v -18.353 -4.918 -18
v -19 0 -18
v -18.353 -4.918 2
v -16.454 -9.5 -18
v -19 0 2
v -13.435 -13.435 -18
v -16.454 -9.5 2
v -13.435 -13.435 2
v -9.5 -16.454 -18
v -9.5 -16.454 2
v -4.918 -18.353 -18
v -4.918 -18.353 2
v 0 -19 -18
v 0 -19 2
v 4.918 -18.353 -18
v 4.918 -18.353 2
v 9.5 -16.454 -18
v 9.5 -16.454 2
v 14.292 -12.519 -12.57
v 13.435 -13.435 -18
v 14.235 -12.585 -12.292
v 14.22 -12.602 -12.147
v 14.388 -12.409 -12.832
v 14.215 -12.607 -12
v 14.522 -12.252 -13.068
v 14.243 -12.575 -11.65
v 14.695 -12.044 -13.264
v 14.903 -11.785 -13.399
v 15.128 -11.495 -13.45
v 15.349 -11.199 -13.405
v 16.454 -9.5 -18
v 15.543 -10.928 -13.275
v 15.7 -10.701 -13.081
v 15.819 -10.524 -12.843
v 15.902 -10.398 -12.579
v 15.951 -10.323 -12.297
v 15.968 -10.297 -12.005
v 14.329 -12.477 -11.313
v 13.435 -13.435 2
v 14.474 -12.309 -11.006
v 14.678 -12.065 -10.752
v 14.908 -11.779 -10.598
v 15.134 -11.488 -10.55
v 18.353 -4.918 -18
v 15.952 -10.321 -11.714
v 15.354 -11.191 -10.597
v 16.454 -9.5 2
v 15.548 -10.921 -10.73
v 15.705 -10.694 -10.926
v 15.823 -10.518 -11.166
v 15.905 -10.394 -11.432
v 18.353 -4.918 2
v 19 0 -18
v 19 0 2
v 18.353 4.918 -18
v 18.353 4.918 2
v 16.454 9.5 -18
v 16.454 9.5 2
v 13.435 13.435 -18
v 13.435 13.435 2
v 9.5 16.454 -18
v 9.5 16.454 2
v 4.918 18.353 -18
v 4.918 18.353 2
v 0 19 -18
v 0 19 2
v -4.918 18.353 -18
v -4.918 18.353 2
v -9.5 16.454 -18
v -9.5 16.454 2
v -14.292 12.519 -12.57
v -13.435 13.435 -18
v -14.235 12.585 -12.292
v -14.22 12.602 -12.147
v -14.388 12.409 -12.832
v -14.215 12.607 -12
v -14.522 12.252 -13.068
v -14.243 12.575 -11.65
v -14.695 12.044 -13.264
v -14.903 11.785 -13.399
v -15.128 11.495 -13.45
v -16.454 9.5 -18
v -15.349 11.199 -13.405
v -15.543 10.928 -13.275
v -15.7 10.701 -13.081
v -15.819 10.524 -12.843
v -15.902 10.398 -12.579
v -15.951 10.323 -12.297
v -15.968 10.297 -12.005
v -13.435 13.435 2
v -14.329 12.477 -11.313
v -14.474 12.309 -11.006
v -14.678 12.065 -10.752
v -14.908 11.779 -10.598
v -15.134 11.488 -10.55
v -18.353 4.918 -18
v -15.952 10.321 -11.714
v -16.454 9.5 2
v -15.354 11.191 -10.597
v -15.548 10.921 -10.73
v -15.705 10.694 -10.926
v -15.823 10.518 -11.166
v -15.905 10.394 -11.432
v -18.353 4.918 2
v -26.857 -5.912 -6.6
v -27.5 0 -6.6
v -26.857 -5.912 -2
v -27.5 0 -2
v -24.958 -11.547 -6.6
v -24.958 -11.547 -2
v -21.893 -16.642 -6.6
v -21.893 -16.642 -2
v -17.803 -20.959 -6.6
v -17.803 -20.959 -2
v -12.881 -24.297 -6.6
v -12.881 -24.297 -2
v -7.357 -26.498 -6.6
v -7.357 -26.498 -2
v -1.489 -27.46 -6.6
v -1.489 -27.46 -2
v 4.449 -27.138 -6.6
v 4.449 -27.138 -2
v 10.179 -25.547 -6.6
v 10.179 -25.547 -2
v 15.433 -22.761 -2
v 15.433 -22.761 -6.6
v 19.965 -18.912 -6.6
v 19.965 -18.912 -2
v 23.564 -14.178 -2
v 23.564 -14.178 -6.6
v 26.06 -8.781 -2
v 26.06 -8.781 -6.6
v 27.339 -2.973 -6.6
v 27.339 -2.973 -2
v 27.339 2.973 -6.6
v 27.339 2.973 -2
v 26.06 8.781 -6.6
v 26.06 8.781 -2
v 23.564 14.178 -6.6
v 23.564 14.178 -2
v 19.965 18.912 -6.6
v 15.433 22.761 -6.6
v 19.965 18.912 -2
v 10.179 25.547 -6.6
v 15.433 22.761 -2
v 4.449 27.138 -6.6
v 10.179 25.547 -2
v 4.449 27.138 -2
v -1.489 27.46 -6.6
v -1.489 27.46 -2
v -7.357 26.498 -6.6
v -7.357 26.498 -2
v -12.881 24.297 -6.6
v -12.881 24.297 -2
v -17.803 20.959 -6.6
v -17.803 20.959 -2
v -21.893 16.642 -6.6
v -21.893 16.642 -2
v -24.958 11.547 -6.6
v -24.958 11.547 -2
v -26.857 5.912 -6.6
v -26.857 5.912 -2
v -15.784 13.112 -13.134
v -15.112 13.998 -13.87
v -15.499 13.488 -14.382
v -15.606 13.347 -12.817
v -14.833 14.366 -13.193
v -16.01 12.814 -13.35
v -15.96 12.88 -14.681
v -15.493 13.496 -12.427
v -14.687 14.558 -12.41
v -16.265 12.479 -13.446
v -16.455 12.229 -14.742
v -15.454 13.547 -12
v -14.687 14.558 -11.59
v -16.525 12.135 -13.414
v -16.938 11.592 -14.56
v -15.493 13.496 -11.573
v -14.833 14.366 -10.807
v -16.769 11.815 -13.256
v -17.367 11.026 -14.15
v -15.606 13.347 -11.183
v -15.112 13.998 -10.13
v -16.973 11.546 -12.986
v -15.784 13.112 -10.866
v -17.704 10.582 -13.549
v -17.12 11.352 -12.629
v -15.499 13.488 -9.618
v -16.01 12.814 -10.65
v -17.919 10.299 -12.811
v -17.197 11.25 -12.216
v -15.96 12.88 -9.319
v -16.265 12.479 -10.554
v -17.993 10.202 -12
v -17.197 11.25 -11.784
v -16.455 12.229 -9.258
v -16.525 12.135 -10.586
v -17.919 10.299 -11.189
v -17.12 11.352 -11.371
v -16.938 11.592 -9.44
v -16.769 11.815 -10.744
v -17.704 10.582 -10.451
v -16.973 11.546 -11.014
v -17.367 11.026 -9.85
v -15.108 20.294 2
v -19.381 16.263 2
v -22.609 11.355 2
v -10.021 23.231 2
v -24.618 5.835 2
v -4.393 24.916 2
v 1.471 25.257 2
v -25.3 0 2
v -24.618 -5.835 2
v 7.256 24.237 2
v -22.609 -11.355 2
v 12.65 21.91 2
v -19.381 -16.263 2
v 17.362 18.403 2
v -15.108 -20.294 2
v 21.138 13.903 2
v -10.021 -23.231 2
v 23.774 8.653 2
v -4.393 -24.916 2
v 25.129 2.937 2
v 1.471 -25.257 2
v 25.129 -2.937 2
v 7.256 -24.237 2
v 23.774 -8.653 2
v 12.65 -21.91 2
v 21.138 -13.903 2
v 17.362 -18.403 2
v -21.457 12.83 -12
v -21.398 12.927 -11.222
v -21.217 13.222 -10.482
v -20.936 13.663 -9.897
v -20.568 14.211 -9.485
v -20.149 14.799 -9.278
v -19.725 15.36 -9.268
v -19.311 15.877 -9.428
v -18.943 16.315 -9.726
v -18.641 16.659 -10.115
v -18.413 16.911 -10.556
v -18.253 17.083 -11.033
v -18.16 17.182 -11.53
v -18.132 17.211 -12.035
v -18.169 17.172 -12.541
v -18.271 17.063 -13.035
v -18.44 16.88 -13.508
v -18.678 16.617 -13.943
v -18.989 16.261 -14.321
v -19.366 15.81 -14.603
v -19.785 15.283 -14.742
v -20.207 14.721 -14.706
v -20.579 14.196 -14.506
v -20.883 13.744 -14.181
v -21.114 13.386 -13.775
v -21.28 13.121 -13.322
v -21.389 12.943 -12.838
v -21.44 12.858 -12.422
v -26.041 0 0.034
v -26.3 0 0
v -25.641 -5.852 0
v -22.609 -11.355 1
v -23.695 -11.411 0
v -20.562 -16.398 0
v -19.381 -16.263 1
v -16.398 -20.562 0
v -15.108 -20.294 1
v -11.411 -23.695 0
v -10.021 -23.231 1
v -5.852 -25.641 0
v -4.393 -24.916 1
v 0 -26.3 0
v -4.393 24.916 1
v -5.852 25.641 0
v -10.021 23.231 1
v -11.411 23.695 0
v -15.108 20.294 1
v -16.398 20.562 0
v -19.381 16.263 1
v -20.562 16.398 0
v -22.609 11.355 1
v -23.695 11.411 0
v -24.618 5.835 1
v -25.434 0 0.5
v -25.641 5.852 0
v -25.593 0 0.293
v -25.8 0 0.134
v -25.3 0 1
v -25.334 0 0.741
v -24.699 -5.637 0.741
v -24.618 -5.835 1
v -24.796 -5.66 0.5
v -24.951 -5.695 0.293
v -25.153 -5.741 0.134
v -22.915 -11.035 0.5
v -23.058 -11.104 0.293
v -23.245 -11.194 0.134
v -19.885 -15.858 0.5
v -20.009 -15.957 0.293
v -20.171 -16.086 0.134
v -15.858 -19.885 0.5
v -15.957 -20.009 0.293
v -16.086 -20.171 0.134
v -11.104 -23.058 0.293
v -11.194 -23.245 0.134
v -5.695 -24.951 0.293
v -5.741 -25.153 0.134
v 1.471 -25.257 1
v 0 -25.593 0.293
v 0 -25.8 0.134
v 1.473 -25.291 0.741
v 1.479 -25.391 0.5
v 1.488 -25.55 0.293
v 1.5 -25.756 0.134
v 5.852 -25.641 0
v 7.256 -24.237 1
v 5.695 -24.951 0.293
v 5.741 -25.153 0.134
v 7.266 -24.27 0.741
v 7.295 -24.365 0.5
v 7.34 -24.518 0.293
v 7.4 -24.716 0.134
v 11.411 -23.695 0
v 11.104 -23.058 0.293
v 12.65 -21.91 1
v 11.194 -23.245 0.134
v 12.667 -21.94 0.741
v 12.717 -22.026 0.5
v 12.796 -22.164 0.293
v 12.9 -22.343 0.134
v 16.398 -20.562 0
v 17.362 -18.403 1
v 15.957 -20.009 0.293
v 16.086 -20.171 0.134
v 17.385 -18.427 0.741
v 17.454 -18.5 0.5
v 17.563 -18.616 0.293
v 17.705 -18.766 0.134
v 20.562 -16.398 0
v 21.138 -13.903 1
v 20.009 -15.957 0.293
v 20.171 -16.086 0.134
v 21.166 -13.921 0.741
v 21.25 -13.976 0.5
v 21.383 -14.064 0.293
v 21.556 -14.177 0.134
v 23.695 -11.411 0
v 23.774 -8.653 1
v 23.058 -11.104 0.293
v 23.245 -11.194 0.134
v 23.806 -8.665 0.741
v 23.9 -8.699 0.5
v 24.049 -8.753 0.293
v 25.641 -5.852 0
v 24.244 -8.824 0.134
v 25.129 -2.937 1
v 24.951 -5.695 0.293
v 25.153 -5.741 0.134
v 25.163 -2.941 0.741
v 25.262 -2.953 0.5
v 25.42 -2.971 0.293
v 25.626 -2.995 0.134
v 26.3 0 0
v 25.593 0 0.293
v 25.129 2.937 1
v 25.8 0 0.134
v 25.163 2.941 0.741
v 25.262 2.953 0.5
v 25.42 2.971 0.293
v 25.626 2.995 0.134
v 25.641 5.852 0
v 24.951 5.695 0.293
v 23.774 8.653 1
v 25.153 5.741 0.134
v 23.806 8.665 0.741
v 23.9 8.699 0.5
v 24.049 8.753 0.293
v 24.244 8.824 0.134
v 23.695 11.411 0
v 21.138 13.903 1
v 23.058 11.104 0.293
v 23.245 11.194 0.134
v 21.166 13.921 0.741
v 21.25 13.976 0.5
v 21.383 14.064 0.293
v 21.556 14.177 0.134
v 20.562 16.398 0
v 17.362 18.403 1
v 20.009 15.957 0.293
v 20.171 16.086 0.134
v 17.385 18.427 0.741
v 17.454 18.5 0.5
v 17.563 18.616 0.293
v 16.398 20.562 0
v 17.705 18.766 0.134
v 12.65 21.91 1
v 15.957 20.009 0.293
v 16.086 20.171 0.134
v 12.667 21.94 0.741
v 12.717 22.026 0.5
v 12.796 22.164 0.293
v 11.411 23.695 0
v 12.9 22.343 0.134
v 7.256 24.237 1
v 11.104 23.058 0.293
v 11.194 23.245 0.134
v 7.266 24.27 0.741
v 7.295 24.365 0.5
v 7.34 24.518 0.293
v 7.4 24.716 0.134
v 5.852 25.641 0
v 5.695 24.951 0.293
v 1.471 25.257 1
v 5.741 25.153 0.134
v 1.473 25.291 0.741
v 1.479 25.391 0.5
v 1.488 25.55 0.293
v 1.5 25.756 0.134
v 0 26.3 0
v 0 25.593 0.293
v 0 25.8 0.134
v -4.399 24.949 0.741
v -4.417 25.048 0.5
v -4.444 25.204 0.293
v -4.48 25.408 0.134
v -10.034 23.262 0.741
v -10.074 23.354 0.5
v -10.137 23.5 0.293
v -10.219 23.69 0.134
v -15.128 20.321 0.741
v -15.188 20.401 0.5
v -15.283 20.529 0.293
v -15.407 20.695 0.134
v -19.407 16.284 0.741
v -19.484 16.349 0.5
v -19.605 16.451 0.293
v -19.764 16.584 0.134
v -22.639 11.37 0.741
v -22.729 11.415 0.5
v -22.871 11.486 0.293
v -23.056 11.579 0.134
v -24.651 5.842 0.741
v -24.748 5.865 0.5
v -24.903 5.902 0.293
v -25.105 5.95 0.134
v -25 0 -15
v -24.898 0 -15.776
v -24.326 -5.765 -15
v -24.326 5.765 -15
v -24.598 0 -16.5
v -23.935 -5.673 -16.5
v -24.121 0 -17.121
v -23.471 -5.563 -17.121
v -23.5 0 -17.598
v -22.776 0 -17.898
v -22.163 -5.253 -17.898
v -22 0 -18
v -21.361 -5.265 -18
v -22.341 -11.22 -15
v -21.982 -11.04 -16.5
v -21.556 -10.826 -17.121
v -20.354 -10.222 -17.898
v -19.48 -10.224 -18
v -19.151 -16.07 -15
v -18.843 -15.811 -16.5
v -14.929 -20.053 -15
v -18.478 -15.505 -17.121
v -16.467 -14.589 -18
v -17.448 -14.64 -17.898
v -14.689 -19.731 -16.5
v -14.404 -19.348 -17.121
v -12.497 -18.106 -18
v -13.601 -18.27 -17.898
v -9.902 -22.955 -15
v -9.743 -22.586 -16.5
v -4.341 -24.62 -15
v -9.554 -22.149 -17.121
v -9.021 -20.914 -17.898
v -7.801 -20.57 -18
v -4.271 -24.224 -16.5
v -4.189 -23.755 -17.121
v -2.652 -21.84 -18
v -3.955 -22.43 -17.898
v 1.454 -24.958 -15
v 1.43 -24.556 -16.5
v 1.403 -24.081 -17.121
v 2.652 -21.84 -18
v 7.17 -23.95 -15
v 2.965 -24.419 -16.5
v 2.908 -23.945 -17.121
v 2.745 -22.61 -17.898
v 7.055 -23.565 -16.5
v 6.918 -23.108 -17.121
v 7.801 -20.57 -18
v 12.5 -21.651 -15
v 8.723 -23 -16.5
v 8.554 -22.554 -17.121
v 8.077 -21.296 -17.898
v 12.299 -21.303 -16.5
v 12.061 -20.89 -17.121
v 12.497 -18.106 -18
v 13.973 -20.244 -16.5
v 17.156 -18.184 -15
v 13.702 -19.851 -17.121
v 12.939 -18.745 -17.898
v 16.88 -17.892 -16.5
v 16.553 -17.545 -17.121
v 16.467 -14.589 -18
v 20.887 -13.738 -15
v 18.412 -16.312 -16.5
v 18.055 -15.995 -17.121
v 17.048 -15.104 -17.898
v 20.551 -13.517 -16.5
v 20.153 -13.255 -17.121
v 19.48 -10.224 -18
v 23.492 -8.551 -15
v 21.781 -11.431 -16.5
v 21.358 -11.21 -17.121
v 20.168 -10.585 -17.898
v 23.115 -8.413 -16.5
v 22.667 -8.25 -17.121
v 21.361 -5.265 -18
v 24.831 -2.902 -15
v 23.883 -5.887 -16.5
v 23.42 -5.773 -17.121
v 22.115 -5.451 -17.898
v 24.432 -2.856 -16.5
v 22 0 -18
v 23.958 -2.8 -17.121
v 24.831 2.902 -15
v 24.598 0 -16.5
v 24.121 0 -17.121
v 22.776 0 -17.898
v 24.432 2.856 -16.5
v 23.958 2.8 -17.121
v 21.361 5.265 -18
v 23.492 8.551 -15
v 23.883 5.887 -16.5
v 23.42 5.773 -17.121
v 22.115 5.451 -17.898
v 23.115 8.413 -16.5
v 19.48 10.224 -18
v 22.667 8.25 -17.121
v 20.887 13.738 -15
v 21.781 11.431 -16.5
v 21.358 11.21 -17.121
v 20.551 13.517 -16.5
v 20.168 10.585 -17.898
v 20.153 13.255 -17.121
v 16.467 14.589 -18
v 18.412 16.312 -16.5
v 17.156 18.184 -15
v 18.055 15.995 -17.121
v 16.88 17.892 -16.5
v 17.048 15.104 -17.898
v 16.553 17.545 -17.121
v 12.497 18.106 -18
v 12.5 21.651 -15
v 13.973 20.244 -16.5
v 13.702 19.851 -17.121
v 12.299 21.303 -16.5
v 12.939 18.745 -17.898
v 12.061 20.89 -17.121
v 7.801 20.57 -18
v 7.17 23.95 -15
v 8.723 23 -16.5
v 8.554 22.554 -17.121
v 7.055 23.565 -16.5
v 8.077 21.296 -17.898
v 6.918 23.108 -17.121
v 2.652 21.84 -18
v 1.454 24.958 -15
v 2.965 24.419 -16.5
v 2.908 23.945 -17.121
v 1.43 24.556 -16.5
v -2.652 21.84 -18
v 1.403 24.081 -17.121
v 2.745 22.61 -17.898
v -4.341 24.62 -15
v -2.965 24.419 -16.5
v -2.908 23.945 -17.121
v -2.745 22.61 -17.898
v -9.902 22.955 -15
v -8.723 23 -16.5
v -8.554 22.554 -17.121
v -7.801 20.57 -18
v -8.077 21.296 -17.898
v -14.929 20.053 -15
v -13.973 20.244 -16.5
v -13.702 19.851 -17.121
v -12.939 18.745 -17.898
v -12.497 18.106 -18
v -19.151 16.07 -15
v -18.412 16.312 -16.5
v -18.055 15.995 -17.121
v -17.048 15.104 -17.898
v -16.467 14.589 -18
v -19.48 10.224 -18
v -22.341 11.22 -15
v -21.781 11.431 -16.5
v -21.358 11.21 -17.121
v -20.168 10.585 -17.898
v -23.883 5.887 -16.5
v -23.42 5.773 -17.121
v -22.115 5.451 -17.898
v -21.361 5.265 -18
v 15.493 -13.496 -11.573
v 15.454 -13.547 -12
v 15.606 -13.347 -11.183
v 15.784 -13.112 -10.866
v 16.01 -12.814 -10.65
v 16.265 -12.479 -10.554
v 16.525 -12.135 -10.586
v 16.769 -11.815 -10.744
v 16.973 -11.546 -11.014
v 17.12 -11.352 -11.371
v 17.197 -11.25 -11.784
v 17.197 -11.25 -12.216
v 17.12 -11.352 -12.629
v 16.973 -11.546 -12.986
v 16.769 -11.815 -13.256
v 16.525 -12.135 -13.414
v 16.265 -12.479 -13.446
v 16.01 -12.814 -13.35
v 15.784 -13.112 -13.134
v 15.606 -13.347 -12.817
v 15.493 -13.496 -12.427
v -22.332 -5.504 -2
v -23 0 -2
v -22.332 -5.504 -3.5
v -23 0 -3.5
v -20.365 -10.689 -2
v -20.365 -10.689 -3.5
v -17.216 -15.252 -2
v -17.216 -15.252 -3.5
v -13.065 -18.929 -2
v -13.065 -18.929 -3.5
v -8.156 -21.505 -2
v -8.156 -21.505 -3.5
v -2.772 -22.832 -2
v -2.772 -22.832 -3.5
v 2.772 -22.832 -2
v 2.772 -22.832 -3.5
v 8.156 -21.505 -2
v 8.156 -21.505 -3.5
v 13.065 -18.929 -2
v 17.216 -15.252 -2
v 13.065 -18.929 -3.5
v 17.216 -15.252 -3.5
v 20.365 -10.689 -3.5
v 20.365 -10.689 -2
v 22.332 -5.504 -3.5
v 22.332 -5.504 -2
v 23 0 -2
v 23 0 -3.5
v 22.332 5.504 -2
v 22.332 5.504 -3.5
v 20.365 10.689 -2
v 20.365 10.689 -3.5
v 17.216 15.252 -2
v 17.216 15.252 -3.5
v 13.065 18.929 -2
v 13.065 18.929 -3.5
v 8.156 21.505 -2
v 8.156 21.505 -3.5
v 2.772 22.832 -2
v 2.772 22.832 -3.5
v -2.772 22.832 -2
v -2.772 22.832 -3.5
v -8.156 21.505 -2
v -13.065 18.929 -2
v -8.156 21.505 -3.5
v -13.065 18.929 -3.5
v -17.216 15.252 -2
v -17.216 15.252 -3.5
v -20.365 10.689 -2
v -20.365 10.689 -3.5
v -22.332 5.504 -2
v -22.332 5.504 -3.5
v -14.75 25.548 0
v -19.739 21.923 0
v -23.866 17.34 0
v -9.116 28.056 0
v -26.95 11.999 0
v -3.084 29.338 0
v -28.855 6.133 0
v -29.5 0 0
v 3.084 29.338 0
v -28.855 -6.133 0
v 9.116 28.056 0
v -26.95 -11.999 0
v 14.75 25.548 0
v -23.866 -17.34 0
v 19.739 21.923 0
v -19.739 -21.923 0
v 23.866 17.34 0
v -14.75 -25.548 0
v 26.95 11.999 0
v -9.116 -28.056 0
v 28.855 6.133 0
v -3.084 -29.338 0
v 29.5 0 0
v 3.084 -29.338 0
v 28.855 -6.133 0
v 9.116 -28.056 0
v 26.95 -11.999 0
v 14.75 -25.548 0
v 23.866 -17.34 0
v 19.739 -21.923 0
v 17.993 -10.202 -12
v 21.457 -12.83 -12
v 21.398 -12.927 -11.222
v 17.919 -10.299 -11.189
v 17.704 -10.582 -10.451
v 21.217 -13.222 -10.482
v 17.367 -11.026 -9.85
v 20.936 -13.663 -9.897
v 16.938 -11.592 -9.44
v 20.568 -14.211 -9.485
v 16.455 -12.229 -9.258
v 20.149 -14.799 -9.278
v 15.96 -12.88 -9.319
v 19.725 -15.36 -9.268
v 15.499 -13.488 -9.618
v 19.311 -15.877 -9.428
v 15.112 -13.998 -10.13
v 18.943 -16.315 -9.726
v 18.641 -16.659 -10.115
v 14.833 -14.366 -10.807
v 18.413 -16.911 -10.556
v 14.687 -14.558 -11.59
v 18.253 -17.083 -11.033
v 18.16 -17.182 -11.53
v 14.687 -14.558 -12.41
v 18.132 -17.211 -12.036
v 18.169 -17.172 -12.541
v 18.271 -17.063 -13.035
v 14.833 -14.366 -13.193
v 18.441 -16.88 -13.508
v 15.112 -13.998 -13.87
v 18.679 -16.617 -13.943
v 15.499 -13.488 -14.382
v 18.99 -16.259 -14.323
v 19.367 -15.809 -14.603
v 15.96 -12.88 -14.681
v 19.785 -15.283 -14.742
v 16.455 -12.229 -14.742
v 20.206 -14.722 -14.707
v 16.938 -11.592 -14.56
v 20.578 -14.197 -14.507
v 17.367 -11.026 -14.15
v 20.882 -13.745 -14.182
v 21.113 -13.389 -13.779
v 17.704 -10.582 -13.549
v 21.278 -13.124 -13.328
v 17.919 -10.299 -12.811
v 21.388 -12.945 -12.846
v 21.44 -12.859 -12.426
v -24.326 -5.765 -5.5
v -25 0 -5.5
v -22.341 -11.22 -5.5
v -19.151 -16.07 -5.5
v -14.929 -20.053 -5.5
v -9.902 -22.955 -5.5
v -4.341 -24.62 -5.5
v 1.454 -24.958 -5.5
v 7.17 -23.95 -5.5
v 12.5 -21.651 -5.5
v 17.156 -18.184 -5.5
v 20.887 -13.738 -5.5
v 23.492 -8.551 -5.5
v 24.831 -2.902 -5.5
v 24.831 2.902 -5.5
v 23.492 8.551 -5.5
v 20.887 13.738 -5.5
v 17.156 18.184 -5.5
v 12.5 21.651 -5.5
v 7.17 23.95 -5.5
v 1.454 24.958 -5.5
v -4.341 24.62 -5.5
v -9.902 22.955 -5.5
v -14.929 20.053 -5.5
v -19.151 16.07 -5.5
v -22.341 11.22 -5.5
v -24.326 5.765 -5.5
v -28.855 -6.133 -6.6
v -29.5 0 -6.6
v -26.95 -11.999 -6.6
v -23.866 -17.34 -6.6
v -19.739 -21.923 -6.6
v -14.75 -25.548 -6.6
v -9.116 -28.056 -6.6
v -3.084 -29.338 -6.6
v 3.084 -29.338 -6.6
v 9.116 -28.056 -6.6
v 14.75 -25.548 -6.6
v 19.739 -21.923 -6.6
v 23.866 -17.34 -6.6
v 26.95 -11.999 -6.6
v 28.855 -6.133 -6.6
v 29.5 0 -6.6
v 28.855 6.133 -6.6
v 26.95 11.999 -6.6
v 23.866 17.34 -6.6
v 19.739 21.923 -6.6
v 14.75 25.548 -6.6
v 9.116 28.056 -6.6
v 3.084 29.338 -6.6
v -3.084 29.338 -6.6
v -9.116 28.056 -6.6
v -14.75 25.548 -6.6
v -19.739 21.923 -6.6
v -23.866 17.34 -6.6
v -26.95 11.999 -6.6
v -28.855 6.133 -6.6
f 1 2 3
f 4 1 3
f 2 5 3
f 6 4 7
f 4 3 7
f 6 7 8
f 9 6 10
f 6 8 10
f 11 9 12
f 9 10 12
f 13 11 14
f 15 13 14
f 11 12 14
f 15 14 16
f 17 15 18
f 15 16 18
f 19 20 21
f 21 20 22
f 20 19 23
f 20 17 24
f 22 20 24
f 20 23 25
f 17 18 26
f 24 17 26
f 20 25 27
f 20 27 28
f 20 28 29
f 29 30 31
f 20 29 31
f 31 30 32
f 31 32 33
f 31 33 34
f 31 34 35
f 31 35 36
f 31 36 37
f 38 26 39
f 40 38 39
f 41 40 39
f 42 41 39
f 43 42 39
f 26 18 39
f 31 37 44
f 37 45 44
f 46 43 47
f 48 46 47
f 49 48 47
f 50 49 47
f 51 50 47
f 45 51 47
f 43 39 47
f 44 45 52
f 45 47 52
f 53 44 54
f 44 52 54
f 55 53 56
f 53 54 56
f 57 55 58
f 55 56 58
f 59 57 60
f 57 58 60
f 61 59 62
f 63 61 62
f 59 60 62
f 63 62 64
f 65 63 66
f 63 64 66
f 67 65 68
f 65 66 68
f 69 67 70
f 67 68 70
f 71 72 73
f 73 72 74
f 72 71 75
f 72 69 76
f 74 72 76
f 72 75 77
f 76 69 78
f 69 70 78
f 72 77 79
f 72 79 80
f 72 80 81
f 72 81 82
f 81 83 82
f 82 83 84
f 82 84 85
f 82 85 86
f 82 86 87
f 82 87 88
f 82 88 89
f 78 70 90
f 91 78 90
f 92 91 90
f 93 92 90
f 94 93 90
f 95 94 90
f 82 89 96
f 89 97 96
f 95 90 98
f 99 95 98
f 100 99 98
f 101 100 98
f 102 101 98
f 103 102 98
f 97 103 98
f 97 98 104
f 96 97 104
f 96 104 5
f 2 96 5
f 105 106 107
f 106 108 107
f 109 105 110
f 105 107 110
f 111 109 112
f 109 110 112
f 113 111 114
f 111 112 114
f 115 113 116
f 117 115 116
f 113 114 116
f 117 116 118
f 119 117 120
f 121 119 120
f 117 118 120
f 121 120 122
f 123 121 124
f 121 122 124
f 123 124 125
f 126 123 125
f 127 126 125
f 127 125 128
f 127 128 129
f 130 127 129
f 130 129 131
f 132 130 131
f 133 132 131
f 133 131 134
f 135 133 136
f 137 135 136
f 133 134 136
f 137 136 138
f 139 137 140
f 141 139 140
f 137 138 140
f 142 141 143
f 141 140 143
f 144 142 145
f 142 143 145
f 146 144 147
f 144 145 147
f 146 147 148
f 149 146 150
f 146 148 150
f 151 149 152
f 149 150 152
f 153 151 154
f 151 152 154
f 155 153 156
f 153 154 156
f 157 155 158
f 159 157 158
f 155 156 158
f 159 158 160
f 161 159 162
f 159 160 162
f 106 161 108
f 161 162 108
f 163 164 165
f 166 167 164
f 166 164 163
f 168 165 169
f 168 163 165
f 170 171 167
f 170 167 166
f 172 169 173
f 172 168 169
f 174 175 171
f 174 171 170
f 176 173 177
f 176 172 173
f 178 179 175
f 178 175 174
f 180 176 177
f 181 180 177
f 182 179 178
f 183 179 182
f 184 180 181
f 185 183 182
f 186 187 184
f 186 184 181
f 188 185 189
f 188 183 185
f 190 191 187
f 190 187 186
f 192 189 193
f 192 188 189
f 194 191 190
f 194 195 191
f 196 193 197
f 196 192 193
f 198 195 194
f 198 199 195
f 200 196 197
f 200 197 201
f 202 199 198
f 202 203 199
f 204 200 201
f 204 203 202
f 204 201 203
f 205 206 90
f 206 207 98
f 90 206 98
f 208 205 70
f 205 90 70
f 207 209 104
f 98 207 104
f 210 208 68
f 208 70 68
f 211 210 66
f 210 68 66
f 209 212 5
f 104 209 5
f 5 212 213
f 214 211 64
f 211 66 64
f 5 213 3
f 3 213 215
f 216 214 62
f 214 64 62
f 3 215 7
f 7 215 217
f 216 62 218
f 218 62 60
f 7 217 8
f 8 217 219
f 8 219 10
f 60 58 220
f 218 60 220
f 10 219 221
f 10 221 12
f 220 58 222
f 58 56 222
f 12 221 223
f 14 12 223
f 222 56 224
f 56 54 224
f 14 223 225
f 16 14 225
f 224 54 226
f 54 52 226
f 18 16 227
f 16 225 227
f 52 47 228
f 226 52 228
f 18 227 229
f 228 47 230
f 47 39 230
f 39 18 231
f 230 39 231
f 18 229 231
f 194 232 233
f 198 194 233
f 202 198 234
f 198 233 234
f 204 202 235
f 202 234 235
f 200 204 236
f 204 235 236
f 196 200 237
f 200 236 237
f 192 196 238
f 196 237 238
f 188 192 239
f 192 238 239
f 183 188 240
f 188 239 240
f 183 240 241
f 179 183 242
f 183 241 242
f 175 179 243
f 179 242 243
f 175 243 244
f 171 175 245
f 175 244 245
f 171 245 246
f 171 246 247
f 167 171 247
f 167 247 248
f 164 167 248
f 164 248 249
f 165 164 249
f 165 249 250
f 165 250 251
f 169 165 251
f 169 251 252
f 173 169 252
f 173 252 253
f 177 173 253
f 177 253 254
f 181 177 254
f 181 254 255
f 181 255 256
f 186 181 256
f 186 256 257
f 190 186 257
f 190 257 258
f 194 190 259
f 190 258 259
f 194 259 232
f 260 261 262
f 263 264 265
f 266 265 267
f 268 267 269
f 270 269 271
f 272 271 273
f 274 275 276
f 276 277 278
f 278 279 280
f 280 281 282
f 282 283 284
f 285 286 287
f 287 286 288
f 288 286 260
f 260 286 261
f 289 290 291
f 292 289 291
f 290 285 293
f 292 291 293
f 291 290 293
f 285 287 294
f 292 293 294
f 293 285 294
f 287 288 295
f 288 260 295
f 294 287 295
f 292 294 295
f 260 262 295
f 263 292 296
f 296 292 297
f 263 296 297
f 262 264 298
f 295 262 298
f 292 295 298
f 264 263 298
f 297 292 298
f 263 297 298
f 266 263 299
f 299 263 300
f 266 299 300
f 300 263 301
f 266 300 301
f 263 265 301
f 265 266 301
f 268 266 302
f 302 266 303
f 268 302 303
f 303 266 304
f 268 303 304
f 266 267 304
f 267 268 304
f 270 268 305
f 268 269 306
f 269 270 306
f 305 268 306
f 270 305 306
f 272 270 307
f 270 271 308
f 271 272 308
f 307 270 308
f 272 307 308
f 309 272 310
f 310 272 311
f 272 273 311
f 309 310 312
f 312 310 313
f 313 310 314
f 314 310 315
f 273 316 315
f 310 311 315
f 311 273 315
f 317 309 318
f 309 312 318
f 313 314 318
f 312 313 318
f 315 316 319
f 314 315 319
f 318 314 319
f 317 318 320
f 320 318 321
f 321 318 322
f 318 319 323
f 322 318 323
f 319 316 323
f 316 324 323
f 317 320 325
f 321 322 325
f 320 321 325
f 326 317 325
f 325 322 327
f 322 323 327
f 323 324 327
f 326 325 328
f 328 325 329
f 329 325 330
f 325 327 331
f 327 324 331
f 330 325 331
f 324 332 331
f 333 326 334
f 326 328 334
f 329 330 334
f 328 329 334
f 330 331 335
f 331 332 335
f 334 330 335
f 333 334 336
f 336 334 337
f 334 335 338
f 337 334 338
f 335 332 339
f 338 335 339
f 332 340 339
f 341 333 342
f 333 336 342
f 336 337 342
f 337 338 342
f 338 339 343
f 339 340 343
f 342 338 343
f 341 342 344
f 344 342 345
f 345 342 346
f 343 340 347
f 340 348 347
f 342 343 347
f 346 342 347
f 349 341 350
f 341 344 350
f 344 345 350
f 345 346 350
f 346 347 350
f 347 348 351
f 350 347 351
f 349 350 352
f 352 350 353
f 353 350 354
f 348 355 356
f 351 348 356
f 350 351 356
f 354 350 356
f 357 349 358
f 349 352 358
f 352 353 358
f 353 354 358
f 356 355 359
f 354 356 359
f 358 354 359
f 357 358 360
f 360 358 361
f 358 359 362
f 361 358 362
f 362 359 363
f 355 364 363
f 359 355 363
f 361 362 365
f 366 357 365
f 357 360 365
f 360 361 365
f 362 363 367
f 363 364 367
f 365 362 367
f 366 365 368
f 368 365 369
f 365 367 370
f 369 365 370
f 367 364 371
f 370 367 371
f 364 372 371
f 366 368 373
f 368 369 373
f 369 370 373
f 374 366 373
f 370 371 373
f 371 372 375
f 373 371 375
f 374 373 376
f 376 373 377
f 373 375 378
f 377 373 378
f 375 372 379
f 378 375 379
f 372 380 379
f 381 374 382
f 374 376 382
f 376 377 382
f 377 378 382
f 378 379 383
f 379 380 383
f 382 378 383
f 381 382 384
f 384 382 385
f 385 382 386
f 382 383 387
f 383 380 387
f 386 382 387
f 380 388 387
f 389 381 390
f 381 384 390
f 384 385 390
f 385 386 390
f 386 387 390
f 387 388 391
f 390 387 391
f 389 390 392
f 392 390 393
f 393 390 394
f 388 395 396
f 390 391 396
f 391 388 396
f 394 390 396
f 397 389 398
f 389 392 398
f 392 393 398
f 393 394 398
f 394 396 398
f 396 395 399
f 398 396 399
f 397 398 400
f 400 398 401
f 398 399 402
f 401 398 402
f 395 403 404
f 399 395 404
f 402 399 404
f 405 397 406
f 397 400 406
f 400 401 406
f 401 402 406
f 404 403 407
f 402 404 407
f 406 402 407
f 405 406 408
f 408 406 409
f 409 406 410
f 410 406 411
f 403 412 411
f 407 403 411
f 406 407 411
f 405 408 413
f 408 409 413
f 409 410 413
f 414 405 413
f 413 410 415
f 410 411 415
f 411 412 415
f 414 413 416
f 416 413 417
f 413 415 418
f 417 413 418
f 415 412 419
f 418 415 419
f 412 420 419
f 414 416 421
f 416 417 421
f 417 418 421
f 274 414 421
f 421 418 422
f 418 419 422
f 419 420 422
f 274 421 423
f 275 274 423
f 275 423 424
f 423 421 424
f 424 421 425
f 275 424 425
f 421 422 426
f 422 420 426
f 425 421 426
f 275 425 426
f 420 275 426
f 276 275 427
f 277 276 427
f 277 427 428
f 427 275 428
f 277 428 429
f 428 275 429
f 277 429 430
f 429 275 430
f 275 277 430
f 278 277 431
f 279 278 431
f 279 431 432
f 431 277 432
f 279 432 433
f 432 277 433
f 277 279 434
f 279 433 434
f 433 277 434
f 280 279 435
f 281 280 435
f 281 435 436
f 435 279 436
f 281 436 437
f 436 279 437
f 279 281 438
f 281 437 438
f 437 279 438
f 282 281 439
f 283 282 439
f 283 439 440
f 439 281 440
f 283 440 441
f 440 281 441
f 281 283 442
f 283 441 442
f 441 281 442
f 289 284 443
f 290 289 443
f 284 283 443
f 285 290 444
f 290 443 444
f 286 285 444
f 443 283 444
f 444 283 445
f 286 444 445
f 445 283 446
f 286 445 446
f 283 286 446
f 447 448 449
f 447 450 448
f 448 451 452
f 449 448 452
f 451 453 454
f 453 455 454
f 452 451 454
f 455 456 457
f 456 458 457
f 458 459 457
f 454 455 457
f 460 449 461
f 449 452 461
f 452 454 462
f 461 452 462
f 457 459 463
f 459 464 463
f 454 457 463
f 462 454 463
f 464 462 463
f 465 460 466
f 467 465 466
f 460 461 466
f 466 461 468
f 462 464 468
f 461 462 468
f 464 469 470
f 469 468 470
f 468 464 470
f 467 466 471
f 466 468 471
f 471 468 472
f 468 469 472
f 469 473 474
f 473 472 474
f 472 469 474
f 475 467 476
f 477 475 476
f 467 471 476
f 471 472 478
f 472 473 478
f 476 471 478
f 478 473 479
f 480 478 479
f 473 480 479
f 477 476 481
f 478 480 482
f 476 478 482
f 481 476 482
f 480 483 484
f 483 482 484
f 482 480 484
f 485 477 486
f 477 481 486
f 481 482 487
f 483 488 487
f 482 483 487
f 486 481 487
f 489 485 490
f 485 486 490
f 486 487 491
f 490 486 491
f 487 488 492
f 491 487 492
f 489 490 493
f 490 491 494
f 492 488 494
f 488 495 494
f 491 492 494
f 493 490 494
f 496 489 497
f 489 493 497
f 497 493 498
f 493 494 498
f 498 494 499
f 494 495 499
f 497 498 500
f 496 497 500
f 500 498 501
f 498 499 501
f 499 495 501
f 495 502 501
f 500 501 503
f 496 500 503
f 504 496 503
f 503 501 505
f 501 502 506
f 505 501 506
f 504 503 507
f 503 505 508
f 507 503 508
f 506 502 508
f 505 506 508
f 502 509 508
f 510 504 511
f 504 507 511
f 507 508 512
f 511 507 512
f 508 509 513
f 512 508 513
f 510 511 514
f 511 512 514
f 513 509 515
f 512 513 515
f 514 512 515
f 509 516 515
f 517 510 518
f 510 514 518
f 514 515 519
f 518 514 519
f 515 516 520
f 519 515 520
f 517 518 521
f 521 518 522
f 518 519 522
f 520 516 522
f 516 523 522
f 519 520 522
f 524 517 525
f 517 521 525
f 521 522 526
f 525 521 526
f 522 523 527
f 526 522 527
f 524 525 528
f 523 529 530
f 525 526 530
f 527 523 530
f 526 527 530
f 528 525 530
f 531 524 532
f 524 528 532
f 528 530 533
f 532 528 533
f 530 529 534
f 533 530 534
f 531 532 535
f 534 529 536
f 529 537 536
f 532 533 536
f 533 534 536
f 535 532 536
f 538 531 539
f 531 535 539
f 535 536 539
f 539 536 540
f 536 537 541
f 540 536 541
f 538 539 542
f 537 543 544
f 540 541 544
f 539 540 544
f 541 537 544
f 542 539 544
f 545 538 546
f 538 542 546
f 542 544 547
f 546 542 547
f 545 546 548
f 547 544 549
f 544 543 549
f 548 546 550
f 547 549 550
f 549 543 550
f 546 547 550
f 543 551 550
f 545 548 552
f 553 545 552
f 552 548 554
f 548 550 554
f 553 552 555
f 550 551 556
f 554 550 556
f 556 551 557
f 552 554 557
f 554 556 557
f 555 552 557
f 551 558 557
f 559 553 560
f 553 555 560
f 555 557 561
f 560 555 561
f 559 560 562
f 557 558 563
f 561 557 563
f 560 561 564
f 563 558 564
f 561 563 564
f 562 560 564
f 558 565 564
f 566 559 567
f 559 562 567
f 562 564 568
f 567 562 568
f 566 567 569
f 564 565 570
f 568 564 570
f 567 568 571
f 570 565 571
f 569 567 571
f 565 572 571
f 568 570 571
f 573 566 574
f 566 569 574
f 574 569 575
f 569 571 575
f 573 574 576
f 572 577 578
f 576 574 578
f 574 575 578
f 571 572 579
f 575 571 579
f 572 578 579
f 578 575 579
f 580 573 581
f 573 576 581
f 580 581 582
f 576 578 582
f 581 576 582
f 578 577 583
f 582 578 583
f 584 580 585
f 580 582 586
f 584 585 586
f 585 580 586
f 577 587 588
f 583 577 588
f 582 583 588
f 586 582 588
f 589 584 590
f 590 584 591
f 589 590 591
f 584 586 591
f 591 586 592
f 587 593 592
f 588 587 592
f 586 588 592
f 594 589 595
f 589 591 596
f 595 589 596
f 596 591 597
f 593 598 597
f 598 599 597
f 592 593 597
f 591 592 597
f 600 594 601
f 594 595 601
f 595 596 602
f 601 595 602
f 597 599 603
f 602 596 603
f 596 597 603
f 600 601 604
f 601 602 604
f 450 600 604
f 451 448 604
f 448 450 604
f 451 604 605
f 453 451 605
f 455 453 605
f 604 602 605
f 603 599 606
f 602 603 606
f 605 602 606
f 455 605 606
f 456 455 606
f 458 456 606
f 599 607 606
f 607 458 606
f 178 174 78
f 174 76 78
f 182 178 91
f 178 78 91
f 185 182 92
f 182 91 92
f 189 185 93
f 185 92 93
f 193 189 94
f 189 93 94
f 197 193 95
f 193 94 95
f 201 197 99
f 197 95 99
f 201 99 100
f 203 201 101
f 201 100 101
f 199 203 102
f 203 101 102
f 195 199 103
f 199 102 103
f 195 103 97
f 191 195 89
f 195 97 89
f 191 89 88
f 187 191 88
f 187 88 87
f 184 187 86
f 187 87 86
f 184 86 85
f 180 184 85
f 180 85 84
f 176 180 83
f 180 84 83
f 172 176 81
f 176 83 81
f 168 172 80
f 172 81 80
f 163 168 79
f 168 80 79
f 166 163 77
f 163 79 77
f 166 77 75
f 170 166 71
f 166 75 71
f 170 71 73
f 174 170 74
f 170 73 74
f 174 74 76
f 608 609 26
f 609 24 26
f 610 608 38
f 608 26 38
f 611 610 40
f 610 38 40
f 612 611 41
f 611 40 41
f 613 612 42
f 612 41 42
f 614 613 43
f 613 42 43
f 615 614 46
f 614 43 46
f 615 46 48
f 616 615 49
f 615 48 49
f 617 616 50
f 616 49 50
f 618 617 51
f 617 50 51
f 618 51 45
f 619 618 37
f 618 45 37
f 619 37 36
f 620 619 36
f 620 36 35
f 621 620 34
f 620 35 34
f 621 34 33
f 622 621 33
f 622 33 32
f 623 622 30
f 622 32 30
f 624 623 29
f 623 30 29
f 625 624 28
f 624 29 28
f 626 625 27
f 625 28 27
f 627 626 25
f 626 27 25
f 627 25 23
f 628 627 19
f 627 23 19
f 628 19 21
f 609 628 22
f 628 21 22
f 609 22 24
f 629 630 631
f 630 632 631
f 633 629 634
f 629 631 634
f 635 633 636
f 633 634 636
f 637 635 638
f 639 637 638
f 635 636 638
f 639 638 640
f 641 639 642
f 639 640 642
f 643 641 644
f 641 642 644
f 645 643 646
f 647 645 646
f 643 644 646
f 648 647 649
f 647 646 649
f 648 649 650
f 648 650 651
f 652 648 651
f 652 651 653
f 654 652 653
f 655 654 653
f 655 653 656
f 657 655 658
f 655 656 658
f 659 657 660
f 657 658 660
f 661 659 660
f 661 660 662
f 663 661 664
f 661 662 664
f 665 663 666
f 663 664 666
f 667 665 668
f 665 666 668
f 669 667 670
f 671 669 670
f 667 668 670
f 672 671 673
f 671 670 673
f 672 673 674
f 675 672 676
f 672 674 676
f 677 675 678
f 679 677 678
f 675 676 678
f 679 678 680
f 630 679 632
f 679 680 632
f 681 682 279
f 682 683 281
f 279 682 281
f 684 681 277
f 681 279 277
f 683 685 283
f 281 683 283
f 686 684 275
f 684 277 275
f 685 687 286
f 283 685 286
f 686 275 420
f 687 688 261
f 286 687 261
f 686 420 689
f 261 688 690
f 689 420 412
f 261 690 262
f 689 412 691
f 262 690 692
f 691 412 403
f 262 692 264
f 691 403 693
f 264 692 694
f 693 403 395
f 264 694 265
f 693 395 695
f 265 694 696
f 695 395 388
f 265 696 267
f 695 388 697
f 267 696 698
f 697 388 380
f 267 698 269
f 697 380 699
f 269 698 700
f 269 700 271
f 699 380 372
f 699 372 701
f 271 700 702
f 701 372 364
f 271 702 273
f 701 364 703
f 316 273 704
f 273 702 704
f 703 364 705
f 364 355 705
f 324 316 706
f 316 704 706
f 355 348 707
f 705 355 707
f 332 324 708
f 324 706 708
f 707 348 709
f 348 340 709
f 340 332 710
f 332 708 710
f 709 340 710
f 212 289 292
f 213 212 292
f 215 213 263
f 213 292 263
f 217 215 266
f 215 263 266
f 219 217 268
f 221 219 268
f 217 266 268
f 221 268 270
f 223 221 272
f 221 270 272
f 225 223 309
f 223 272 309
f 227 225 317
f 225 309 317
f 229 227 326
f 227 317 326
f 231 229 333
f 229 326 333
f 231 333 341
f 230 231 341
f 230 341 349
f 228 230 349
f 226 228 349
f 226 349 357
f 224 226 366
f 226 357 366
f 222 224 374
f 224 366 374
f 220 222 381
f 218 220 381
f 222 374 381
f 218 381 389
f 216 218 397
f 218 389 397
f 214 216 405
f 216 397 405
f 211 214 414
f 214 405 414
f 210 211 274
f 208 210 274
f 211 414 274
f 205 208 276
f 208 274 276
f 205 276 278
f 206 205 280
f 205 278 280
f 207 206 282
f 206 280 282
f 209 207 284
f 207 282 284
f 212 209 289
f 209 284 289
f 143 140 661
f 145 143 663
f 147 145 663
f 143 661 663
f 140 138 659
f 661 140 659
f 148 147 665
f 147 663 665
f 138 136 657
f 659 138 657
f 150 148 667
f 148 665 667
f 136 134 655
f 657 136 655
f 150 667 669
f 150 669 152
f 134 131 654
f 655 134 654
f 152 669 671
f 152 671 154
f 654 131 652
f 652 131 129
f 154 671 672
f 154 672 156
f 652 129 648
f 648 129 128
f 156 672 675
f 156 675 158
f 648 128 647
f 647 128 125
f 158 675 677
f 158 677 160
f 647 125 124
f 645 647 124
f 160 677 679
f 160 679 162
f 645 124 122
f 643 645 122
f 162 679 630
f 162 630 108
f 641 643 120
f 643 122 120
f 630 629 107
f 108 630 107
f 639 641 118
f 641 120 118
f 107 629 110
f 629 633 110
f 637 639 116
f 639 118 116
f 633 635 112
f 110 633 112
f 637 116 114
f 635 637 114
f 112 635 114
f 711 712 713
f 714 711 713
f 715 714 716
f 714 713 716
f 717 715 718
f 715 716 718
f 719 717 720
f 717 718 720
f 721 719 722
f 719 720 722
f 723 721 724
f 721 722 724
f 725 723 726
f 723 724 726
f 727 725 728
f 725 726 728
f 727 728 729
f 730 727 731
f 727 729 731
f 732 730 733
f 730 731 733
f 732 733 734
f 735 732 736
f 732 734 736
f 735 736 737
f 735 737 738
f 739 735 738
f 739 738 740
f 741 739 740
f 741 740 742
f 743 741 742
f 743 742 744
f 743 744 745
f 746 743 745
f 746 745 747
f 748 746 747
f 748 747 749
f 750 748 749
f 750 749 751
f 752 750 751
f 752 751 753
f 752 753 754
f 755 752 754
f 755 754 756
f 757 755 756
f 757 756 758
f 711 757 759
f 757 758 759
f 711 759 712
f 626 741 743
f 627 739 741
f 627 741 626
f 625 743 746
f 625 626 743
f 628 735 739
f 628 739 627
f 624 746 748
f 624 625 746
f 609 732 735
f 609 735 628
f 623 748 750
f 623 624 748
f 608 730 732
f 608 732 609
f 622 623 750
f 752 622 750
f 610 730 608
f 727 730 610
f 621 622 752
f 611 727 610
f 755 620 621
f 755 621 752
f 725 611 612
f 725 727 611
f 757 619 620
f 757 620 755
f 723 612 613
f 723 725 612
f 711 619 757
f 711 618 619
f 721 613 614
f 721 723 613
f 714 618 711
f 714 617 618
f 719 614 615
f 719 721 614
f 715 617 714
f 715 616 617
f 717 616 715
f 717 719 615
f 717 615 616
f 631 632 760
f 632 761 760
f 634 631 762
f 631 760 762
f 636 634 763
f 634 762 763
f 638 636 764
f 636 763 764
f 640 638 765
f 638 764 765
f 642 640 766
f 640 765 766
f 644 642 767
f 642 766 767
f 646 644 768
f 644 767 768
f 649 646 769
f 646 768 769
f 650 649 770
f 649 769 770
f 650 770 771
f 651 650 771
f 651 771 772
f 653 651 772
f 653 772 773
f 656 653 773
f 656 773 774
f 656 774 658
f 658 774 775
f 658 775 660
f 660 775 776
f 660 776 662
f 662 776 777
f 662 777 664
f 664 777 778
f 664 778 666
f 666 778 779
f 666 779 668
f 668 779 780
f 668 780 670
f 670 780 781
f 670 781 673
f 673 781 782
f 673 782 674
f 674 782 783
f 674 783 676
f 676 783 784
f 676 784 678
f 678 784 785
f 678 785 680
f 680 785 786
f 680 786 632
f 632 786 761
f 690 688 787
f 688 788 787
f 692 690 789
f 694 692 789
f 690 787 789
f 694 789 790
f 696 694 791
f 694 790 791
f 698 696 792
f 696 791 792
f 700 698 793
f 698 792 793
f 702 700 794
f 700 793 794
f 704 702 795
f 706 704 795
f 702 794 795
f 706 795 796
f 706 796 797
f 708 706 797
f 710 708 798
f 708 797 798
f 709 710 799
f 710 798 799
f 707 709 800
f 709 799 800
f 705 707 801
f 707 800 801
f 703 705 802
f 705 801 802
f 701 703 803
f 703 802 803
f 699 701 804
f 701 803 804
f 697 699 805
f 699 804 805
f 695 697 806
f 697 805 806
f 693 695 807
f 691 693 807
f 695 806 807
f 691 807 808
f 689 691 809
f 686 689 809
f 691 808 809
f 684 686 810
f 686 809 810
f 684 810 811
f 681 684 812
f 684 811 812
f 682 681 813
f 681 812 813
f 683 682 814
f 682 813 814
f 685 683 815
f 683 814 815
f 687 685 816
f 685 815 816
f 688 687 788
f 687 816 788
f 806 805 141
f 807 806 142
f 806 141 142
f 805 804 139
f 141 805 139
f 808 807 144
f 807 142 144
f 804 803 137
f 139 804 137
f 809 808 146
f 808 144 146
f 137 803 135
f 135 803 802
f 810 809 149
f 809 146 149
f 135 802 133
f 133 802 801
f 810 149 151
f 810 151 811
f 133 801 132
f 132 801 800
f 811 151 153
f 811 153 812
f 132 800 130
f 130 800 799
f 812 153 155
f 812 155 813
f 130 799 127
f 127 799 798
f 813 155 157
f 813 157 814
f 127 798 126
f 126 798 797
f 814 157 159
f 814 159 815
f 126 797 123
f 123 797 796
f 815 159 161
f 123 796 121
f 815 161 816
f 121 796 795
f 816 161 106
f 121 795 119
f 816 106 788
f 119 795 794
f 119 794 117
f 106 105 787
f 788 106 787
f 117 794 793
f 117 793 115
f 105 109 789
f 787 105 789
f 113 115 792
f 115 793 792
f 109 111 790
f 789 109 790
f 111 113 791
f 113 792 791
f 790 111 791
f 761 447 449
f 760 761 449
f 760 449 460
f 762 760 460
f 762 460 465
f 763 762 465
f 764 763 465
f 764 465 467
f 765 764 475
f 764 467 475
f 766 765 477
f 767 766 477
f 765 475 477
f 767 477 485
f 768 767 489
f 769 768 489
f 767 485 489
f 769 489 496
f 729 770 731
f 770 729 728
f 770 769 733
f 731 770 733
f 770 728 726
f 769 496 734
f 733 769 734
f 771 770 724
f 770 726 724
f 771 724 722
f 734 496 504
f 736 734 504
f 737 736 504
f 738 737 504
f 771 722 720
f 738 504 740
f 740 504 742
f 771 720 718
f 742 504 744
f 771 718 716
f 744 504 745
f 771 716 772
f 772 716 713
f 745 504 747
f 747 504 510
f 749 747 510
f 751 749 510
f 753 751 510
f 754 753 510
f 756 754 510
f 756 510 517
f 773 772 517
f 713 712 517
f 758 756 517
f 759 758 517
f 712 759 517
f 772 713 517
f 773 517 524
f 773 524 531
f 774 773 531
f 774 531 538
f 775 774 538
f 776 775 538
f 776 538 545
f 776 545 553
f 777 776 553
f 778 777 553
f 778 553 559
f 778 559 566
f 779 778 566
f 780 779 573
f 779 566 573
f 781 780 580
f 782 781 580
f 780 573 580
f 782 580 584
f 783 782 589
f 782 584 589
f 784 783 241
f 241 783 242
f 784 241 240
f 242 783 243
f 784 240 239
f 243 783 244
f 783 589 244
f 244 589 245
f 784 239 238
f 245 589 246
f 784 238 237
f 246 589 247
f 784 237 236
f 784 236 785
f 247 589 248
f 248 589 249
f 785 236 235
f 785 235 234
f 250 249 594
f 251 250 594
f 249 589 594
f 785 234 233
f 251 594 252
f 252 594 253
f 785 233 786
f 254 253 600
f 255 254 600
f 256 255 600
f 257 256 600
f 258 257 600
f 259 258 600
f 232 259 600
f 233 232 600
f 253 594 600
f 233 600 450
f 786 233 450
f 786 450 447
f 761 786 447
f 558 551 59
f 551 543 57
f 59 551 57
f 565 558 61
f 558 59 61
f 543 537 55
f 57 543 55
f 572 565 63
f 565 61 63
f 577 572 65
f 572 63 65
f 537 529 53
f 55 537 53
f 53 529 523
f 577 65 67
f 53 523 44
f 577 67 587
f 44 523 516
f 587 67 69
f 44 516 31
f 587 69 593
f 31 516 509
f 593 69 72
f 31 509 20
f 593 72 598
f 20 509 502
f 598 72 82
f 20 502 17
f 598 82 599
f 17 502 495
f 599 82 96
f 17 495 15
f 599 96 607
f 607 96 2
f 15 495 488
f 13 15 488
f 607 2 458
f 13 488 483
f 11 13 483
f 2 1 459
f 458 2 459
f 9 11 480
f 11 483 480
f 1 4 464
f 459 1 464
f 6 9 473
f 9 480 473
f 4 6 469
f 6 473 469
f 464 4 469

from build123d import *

# Parameters (mm, degrees)
FILLET1_R                                  = 3
FILLET2_R                                  = 1
CBORE_FOR_M2_5_SHCS1_D                     = 2.9
CBORE_FOR_M2_5_SHCS1_DEPTH                 = 8
CBORE_FOR_M2_5_SHCS1_CBORE_D               = 5.5
CBORE_FOR_M2_5_SHCS1_CBORE_DEPTH           = 4.5
CBORE_FOR_M2_5_SHCS1_TIP                   = 0.871247898
CBORE_FOR_M2_5_SHCS1_ON_FACE_2_D           = 2.9
CBORE_FOR_M2_5_SHCS1_ON_FACE_2_DEPTH       = 8
CBORE_FOR_M2_5_SHCS1_ON_FACE_2_CBORE_D     = 5.5
CBORE_FOR_M2_5_SHCS1_ON_FACE_2_CBORE_DEPTH = 4.5
CBORE_FOR_M2_5_SHCS1_ON_FACE_2_TIP         = 0.871247898


with BuildPart() as part:
    # Sketch2 → Revolve1 (revolve)
    with BuildSketch(Plane(origin=(0, 0, 0), x_dir=(1, 0, 0), z_dir=(0, 1, 0))):
        Polygon((-23, 2), (-23, 3.5), (-25, 5.5), (-25, 18), (-19, 18), (-19, -2), (-25.3, -2), (-25.3, 0), (-29.5, 0), (-29.5, 6.6), (-27.5, 6.6), (-27.5, 2), align=None)
    revolve(axis=Axis((0, 0, -30.363549001), (0, 0, 1)))

    # Fillet1
    fillet1_edges = [part.edges().sort_by_distance(p)[0] for p in [
        (25, 0, -18),
    ]]
    fillet(fillet1_edges, radius=FILLET1_R)

    # Fillet2
    fillet2_edges = [part.edges().sort_by_distance(p)[0] for p in [
        (25.3, 0, 0),
    ]]
    fillet(fillet2_edges, radius=FILLET2_R)

    # CBORE for M2.5 SHCS1
    with Locations(Plane(origin=(-19.915129246, 15.112499036, -12), x_dir=(-0.604499961451, -0.796605169834, 0), z_dir=(-0.796605169834, 0.604499961451, 0))):
        with Locations((0, 0)):
            CounterBoreHole(CBORE_FOR_M2_5_SHCS1_D / 2, CBORE_FOR_M2_5_SHCS1_CBORE_D / 2, CBORE_FOR_M2_5_SHCS1_CBORE_DEPTH, depth=CBORE_FOR_M2_5_SHCS1_DEPTH)
            with Locations((0, 0, -(CBORE_FOR_M2_5_SHCS1_DEPTH + CBORE_FOR_M2_5_SHCS1_TIP / 2))):  # 118° drill point
                Cone(0, CBORE_FOR_M2_5_SHCS1_D / 2, CBORE_FOR_M2_5_SHCS1_TIP, mode=Mode.SUBTRACT)

    # CBORE for M2.5 SHCS1 on face 2
    with Locations(Plane(origin=(19.915129246, -15.112499036, -12), x_dir=(0.604500067696, 0.79660508921, 0), z_dir=(0.79660508921, -0.604500067696, 0))):
        with Locations((0, 0)):
            CounterBoreHole(CBORE_FOR_M2_5_SHCS1_ON_FACE_2_D / 2, CBORE_FOR_M2_5_SHCS1_ON_FACE_2_CBORE_D / 2, CBORE_FOR_M2_5_SHCS1_ON_FACE_2_CBORE_DEPTH, depth=CBORE_FOR_M2_5_SHCS1_ON_FACE_2_DEPTH)
            with Locations((0, 0, -(CBORE_FOR_M2_5_SHCS1_ON_FACE_2_DEPTH + CBORE_FOR_M2_5_SHCS1_ON_FACE_2_TIP / 2))):  # 118° drill point
                Cone(0, CBORE_FOR_M2_5_SHCS1_ON_FACE_2_D / 2, CBORE_FOR_M2_5_SHCS1_ON_FACE_2_TIP, mode=Mode.SUBTRACT)


solid = part.part
